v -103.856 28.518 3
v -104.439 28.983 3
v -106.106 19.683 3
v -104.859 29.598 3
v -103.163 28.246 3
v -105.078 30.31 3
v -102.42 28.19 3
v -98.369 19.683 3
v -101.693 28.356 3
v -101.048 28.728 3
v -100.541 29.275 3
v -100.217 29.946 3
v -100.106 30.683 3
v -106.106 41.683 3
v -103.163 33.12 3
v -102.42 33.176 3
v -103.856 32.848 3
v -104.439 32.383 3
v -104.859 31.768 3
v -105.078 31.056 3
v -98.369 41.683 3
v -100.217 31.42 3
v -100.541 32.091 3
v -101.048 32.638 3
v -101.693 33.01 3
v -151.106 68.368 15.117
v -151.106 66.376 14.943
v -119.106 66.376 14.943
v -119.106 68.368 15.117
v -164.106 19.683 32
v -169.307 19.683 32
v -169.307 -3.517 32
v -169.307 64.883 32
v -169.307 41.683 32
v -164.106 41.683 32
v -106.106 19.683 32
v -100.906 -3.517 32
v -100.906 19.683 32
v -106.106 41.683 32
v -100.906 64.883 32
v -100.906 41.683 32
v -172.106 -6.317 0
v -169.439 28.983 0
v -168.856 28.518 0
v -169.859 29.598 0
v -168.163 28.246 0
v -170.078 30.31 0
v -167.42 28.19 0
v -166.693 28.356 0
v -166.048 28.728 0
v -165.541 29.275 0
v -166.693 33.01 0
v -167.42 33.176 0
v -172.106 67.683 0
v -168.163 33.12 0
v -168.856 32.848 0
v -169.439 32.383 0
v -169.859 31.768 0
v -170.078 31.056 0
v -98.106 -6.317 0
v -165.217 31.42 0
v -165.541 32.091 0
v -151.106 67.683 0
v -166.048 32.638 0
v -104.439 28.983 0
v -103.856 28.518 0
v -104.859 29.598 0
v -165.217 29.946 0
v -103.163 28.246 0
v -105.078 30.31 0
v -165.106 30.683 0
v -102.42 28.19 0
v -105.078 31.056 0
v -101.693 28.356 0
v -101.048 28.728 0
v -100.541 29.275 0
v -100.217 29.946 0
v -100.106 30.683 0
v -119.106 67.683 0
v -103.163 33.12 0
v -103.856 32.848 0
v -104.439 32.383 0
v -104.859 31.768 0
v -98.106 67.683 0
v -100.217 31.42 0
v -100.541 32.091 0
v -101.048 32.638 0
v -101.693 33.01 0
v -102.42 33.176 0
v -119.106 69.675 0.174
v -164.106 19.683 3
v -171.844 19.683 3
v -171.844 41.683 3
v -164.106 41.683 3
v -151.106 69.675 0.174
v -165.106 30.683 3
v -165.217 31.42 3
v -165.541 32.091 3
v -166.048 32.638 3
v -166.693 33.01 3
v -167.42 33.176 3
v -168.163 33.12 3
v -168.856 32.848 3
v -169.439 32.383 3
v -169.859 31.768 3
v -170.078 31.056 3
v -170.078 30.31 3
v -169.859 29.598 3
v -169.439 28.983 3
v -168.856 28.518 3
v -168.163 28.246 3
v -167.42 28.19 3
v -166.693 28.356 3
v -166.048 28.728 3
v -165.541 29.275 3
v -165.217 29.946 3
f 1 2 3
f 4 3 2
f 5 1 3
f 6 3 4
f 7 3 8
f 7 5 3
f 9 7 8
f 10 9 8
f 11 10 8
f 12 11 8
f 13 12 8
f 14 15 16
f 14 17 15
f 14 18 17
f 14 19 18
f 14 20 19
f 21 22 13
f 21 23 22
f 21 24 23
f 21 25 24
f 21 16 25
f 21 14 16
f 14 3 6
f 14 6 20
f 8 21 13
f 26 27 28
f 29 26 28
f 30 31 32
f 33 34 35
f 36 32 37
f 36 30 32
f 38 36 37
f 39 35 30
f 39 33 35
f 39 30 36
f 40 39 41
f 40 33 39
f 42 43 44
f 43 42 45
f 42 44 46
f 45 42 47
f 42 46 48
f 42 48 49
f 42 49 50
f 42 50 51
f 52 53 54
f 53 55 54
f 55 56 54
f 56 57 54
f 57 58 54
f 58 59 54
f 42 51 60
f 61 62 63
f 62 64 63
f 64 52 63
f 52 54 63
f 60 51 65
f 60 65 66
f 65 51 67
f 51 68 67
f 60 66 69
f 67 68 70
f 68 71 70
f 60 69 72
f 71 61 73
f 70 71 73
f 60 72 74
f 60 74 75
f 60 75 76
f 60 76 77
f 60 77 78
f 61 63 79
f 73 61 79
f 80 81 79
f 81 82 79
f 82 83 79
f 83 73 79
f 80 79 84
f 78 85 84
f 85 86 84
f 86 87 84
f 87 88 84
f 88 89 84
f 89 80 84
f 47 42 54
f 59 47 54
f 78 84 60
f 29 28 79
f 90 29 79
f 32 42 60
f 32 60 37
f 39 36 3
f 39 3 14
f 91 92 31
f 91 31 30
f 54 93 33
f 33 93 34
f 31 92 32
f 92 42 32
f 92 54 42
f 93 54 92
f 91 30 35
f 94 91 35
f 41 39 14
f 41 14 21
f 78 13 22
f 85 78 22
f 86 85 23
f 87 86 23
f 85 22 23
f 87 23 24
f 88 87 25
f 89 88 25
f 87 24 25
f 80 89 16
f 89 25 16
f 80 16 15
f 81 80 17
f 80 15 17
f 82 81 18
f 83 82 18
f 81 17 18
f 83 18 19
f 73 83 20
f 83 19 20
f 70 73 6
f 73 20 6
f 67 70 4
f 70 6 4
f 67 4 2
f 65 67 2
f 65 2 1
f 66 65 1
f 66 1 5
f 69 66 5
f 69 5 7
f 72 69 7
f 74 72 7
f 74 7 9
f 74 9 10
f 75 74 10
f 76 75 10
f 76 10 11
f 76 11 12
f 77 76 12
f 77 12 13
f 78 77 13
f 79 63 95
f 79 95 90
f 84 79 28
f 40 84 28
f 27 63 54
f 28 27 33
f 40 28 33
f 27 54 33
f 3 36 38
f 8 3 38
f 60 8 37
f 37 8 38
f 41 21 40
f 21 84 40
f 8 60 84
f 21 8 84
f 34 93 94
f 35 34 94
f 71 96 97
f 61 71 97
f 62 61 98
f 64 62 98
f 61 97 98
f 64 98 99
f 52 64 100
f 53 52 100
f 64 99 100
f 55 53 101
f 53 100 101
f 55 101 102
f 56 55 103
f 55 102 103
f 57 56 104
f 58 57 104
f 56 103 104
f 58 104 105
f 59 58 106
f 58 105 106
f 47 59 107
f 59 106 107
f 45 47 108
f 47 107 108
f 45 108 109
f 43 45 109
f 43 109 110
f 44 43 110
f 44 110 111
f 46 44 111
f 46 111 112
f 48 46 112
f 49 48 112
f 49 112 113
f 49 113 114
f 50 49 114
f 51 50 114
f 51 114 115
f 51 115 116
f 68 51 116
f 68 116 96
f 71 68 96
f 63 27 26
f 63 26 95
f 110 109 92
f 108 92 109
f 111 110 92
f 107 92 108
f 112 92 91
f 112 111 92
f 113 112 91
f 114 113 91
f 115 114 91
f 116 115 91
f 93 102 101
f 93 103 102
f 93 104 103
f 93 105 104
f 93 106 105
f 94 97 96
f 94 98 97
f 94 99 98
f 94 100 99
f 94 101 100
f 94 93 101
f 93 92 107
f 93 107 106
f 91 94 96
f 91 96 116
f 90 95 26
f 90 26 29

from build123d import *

# Parameters (mm, degrees)
ESQUISSE1_W             = 74
ESQUISSE1_H             = 74
BOSS_EXTRU_1_DEPTH      = 32
BOSS_EXTRU_1_TAPER      = 5
ESQUISSE2_W             = 19.942710043
ESQUISSE2_H             = 22
ESQUISSE2_W_2           = 15.933949428
ENL_V_MAT_EXTRU_1_DEPTH = 29
ESQUISSE3_R             = 2.5
ENL_V_MAT_EXTRU_2_DEPTH = 10
ESQUISSE5_W             = 32
ESQUISSE5_H             = 15
BOSS_EXTRU_2_DEPTH      = 2


with BuildPart() as part:
    # Esquisse1 → Boss.-Extru.1 (new body)
    with BuildSketch(Plane.XY):
        with Locations((-135.106350006, 30.682970669)):
            Rectangle(ESQUISSE1_W, ESQUISSE1_H)
    extrude(amount=BOSS_EXTRU_1_DEPTH, taper=BOSS_EXTRU_1_TAPER)

    # Esquisse2 → Enlèv. mat.-Extru.1 (cut)
    with BuildSketch(Plane.XY.offset(32)):
        with Locations((-174.077705028, 30.682970669)):
            Rectangle(ESQUISSE2_W, ESQUISSE2_H)
        with Locations((-98.139375292, 30.682970669)):
            Rectangle(ESQUISSE2_W_2, ESQUISSE2_H)
    extrude(amount=-ENL_V_MAT_EXTRU_1_DEPTH, mode=Mode.SUBTRACT)

    # Esquisse3 → Enlèv. mat.-Extru.2 (cut)
    with BuildSketch(Plane.XY.offset(3)):
        with Locations((-167.606350006, 30.682970669)):
            Circle(ESQUISSE3_R)
        with Locations((-102.606350006, 30.682970669)):
            Circle(ESQUISSE3_R)
    extrude(amount=-ENL_V_MAT_EXTRU_2_DEPTH, mode=Mode.SUBTRACT)

    # Esquisse5 → Boss.-Extru.2 (add)
    with BuildSketch(Plane(origin=(0, 67.168842465, 5.876512258), x_dir=(1, 0, 0), z_dir=(0, 0.9961946980917457, 0.08715574274765837))):
        with Locations((-135.106350006, -1.60104042)):
            Rectangle(ESQUISSE5_W, ESQUISSE5_H)
    extrude(amount=BOSS_EXTRU_2_DEPTH)


solid = part.part
